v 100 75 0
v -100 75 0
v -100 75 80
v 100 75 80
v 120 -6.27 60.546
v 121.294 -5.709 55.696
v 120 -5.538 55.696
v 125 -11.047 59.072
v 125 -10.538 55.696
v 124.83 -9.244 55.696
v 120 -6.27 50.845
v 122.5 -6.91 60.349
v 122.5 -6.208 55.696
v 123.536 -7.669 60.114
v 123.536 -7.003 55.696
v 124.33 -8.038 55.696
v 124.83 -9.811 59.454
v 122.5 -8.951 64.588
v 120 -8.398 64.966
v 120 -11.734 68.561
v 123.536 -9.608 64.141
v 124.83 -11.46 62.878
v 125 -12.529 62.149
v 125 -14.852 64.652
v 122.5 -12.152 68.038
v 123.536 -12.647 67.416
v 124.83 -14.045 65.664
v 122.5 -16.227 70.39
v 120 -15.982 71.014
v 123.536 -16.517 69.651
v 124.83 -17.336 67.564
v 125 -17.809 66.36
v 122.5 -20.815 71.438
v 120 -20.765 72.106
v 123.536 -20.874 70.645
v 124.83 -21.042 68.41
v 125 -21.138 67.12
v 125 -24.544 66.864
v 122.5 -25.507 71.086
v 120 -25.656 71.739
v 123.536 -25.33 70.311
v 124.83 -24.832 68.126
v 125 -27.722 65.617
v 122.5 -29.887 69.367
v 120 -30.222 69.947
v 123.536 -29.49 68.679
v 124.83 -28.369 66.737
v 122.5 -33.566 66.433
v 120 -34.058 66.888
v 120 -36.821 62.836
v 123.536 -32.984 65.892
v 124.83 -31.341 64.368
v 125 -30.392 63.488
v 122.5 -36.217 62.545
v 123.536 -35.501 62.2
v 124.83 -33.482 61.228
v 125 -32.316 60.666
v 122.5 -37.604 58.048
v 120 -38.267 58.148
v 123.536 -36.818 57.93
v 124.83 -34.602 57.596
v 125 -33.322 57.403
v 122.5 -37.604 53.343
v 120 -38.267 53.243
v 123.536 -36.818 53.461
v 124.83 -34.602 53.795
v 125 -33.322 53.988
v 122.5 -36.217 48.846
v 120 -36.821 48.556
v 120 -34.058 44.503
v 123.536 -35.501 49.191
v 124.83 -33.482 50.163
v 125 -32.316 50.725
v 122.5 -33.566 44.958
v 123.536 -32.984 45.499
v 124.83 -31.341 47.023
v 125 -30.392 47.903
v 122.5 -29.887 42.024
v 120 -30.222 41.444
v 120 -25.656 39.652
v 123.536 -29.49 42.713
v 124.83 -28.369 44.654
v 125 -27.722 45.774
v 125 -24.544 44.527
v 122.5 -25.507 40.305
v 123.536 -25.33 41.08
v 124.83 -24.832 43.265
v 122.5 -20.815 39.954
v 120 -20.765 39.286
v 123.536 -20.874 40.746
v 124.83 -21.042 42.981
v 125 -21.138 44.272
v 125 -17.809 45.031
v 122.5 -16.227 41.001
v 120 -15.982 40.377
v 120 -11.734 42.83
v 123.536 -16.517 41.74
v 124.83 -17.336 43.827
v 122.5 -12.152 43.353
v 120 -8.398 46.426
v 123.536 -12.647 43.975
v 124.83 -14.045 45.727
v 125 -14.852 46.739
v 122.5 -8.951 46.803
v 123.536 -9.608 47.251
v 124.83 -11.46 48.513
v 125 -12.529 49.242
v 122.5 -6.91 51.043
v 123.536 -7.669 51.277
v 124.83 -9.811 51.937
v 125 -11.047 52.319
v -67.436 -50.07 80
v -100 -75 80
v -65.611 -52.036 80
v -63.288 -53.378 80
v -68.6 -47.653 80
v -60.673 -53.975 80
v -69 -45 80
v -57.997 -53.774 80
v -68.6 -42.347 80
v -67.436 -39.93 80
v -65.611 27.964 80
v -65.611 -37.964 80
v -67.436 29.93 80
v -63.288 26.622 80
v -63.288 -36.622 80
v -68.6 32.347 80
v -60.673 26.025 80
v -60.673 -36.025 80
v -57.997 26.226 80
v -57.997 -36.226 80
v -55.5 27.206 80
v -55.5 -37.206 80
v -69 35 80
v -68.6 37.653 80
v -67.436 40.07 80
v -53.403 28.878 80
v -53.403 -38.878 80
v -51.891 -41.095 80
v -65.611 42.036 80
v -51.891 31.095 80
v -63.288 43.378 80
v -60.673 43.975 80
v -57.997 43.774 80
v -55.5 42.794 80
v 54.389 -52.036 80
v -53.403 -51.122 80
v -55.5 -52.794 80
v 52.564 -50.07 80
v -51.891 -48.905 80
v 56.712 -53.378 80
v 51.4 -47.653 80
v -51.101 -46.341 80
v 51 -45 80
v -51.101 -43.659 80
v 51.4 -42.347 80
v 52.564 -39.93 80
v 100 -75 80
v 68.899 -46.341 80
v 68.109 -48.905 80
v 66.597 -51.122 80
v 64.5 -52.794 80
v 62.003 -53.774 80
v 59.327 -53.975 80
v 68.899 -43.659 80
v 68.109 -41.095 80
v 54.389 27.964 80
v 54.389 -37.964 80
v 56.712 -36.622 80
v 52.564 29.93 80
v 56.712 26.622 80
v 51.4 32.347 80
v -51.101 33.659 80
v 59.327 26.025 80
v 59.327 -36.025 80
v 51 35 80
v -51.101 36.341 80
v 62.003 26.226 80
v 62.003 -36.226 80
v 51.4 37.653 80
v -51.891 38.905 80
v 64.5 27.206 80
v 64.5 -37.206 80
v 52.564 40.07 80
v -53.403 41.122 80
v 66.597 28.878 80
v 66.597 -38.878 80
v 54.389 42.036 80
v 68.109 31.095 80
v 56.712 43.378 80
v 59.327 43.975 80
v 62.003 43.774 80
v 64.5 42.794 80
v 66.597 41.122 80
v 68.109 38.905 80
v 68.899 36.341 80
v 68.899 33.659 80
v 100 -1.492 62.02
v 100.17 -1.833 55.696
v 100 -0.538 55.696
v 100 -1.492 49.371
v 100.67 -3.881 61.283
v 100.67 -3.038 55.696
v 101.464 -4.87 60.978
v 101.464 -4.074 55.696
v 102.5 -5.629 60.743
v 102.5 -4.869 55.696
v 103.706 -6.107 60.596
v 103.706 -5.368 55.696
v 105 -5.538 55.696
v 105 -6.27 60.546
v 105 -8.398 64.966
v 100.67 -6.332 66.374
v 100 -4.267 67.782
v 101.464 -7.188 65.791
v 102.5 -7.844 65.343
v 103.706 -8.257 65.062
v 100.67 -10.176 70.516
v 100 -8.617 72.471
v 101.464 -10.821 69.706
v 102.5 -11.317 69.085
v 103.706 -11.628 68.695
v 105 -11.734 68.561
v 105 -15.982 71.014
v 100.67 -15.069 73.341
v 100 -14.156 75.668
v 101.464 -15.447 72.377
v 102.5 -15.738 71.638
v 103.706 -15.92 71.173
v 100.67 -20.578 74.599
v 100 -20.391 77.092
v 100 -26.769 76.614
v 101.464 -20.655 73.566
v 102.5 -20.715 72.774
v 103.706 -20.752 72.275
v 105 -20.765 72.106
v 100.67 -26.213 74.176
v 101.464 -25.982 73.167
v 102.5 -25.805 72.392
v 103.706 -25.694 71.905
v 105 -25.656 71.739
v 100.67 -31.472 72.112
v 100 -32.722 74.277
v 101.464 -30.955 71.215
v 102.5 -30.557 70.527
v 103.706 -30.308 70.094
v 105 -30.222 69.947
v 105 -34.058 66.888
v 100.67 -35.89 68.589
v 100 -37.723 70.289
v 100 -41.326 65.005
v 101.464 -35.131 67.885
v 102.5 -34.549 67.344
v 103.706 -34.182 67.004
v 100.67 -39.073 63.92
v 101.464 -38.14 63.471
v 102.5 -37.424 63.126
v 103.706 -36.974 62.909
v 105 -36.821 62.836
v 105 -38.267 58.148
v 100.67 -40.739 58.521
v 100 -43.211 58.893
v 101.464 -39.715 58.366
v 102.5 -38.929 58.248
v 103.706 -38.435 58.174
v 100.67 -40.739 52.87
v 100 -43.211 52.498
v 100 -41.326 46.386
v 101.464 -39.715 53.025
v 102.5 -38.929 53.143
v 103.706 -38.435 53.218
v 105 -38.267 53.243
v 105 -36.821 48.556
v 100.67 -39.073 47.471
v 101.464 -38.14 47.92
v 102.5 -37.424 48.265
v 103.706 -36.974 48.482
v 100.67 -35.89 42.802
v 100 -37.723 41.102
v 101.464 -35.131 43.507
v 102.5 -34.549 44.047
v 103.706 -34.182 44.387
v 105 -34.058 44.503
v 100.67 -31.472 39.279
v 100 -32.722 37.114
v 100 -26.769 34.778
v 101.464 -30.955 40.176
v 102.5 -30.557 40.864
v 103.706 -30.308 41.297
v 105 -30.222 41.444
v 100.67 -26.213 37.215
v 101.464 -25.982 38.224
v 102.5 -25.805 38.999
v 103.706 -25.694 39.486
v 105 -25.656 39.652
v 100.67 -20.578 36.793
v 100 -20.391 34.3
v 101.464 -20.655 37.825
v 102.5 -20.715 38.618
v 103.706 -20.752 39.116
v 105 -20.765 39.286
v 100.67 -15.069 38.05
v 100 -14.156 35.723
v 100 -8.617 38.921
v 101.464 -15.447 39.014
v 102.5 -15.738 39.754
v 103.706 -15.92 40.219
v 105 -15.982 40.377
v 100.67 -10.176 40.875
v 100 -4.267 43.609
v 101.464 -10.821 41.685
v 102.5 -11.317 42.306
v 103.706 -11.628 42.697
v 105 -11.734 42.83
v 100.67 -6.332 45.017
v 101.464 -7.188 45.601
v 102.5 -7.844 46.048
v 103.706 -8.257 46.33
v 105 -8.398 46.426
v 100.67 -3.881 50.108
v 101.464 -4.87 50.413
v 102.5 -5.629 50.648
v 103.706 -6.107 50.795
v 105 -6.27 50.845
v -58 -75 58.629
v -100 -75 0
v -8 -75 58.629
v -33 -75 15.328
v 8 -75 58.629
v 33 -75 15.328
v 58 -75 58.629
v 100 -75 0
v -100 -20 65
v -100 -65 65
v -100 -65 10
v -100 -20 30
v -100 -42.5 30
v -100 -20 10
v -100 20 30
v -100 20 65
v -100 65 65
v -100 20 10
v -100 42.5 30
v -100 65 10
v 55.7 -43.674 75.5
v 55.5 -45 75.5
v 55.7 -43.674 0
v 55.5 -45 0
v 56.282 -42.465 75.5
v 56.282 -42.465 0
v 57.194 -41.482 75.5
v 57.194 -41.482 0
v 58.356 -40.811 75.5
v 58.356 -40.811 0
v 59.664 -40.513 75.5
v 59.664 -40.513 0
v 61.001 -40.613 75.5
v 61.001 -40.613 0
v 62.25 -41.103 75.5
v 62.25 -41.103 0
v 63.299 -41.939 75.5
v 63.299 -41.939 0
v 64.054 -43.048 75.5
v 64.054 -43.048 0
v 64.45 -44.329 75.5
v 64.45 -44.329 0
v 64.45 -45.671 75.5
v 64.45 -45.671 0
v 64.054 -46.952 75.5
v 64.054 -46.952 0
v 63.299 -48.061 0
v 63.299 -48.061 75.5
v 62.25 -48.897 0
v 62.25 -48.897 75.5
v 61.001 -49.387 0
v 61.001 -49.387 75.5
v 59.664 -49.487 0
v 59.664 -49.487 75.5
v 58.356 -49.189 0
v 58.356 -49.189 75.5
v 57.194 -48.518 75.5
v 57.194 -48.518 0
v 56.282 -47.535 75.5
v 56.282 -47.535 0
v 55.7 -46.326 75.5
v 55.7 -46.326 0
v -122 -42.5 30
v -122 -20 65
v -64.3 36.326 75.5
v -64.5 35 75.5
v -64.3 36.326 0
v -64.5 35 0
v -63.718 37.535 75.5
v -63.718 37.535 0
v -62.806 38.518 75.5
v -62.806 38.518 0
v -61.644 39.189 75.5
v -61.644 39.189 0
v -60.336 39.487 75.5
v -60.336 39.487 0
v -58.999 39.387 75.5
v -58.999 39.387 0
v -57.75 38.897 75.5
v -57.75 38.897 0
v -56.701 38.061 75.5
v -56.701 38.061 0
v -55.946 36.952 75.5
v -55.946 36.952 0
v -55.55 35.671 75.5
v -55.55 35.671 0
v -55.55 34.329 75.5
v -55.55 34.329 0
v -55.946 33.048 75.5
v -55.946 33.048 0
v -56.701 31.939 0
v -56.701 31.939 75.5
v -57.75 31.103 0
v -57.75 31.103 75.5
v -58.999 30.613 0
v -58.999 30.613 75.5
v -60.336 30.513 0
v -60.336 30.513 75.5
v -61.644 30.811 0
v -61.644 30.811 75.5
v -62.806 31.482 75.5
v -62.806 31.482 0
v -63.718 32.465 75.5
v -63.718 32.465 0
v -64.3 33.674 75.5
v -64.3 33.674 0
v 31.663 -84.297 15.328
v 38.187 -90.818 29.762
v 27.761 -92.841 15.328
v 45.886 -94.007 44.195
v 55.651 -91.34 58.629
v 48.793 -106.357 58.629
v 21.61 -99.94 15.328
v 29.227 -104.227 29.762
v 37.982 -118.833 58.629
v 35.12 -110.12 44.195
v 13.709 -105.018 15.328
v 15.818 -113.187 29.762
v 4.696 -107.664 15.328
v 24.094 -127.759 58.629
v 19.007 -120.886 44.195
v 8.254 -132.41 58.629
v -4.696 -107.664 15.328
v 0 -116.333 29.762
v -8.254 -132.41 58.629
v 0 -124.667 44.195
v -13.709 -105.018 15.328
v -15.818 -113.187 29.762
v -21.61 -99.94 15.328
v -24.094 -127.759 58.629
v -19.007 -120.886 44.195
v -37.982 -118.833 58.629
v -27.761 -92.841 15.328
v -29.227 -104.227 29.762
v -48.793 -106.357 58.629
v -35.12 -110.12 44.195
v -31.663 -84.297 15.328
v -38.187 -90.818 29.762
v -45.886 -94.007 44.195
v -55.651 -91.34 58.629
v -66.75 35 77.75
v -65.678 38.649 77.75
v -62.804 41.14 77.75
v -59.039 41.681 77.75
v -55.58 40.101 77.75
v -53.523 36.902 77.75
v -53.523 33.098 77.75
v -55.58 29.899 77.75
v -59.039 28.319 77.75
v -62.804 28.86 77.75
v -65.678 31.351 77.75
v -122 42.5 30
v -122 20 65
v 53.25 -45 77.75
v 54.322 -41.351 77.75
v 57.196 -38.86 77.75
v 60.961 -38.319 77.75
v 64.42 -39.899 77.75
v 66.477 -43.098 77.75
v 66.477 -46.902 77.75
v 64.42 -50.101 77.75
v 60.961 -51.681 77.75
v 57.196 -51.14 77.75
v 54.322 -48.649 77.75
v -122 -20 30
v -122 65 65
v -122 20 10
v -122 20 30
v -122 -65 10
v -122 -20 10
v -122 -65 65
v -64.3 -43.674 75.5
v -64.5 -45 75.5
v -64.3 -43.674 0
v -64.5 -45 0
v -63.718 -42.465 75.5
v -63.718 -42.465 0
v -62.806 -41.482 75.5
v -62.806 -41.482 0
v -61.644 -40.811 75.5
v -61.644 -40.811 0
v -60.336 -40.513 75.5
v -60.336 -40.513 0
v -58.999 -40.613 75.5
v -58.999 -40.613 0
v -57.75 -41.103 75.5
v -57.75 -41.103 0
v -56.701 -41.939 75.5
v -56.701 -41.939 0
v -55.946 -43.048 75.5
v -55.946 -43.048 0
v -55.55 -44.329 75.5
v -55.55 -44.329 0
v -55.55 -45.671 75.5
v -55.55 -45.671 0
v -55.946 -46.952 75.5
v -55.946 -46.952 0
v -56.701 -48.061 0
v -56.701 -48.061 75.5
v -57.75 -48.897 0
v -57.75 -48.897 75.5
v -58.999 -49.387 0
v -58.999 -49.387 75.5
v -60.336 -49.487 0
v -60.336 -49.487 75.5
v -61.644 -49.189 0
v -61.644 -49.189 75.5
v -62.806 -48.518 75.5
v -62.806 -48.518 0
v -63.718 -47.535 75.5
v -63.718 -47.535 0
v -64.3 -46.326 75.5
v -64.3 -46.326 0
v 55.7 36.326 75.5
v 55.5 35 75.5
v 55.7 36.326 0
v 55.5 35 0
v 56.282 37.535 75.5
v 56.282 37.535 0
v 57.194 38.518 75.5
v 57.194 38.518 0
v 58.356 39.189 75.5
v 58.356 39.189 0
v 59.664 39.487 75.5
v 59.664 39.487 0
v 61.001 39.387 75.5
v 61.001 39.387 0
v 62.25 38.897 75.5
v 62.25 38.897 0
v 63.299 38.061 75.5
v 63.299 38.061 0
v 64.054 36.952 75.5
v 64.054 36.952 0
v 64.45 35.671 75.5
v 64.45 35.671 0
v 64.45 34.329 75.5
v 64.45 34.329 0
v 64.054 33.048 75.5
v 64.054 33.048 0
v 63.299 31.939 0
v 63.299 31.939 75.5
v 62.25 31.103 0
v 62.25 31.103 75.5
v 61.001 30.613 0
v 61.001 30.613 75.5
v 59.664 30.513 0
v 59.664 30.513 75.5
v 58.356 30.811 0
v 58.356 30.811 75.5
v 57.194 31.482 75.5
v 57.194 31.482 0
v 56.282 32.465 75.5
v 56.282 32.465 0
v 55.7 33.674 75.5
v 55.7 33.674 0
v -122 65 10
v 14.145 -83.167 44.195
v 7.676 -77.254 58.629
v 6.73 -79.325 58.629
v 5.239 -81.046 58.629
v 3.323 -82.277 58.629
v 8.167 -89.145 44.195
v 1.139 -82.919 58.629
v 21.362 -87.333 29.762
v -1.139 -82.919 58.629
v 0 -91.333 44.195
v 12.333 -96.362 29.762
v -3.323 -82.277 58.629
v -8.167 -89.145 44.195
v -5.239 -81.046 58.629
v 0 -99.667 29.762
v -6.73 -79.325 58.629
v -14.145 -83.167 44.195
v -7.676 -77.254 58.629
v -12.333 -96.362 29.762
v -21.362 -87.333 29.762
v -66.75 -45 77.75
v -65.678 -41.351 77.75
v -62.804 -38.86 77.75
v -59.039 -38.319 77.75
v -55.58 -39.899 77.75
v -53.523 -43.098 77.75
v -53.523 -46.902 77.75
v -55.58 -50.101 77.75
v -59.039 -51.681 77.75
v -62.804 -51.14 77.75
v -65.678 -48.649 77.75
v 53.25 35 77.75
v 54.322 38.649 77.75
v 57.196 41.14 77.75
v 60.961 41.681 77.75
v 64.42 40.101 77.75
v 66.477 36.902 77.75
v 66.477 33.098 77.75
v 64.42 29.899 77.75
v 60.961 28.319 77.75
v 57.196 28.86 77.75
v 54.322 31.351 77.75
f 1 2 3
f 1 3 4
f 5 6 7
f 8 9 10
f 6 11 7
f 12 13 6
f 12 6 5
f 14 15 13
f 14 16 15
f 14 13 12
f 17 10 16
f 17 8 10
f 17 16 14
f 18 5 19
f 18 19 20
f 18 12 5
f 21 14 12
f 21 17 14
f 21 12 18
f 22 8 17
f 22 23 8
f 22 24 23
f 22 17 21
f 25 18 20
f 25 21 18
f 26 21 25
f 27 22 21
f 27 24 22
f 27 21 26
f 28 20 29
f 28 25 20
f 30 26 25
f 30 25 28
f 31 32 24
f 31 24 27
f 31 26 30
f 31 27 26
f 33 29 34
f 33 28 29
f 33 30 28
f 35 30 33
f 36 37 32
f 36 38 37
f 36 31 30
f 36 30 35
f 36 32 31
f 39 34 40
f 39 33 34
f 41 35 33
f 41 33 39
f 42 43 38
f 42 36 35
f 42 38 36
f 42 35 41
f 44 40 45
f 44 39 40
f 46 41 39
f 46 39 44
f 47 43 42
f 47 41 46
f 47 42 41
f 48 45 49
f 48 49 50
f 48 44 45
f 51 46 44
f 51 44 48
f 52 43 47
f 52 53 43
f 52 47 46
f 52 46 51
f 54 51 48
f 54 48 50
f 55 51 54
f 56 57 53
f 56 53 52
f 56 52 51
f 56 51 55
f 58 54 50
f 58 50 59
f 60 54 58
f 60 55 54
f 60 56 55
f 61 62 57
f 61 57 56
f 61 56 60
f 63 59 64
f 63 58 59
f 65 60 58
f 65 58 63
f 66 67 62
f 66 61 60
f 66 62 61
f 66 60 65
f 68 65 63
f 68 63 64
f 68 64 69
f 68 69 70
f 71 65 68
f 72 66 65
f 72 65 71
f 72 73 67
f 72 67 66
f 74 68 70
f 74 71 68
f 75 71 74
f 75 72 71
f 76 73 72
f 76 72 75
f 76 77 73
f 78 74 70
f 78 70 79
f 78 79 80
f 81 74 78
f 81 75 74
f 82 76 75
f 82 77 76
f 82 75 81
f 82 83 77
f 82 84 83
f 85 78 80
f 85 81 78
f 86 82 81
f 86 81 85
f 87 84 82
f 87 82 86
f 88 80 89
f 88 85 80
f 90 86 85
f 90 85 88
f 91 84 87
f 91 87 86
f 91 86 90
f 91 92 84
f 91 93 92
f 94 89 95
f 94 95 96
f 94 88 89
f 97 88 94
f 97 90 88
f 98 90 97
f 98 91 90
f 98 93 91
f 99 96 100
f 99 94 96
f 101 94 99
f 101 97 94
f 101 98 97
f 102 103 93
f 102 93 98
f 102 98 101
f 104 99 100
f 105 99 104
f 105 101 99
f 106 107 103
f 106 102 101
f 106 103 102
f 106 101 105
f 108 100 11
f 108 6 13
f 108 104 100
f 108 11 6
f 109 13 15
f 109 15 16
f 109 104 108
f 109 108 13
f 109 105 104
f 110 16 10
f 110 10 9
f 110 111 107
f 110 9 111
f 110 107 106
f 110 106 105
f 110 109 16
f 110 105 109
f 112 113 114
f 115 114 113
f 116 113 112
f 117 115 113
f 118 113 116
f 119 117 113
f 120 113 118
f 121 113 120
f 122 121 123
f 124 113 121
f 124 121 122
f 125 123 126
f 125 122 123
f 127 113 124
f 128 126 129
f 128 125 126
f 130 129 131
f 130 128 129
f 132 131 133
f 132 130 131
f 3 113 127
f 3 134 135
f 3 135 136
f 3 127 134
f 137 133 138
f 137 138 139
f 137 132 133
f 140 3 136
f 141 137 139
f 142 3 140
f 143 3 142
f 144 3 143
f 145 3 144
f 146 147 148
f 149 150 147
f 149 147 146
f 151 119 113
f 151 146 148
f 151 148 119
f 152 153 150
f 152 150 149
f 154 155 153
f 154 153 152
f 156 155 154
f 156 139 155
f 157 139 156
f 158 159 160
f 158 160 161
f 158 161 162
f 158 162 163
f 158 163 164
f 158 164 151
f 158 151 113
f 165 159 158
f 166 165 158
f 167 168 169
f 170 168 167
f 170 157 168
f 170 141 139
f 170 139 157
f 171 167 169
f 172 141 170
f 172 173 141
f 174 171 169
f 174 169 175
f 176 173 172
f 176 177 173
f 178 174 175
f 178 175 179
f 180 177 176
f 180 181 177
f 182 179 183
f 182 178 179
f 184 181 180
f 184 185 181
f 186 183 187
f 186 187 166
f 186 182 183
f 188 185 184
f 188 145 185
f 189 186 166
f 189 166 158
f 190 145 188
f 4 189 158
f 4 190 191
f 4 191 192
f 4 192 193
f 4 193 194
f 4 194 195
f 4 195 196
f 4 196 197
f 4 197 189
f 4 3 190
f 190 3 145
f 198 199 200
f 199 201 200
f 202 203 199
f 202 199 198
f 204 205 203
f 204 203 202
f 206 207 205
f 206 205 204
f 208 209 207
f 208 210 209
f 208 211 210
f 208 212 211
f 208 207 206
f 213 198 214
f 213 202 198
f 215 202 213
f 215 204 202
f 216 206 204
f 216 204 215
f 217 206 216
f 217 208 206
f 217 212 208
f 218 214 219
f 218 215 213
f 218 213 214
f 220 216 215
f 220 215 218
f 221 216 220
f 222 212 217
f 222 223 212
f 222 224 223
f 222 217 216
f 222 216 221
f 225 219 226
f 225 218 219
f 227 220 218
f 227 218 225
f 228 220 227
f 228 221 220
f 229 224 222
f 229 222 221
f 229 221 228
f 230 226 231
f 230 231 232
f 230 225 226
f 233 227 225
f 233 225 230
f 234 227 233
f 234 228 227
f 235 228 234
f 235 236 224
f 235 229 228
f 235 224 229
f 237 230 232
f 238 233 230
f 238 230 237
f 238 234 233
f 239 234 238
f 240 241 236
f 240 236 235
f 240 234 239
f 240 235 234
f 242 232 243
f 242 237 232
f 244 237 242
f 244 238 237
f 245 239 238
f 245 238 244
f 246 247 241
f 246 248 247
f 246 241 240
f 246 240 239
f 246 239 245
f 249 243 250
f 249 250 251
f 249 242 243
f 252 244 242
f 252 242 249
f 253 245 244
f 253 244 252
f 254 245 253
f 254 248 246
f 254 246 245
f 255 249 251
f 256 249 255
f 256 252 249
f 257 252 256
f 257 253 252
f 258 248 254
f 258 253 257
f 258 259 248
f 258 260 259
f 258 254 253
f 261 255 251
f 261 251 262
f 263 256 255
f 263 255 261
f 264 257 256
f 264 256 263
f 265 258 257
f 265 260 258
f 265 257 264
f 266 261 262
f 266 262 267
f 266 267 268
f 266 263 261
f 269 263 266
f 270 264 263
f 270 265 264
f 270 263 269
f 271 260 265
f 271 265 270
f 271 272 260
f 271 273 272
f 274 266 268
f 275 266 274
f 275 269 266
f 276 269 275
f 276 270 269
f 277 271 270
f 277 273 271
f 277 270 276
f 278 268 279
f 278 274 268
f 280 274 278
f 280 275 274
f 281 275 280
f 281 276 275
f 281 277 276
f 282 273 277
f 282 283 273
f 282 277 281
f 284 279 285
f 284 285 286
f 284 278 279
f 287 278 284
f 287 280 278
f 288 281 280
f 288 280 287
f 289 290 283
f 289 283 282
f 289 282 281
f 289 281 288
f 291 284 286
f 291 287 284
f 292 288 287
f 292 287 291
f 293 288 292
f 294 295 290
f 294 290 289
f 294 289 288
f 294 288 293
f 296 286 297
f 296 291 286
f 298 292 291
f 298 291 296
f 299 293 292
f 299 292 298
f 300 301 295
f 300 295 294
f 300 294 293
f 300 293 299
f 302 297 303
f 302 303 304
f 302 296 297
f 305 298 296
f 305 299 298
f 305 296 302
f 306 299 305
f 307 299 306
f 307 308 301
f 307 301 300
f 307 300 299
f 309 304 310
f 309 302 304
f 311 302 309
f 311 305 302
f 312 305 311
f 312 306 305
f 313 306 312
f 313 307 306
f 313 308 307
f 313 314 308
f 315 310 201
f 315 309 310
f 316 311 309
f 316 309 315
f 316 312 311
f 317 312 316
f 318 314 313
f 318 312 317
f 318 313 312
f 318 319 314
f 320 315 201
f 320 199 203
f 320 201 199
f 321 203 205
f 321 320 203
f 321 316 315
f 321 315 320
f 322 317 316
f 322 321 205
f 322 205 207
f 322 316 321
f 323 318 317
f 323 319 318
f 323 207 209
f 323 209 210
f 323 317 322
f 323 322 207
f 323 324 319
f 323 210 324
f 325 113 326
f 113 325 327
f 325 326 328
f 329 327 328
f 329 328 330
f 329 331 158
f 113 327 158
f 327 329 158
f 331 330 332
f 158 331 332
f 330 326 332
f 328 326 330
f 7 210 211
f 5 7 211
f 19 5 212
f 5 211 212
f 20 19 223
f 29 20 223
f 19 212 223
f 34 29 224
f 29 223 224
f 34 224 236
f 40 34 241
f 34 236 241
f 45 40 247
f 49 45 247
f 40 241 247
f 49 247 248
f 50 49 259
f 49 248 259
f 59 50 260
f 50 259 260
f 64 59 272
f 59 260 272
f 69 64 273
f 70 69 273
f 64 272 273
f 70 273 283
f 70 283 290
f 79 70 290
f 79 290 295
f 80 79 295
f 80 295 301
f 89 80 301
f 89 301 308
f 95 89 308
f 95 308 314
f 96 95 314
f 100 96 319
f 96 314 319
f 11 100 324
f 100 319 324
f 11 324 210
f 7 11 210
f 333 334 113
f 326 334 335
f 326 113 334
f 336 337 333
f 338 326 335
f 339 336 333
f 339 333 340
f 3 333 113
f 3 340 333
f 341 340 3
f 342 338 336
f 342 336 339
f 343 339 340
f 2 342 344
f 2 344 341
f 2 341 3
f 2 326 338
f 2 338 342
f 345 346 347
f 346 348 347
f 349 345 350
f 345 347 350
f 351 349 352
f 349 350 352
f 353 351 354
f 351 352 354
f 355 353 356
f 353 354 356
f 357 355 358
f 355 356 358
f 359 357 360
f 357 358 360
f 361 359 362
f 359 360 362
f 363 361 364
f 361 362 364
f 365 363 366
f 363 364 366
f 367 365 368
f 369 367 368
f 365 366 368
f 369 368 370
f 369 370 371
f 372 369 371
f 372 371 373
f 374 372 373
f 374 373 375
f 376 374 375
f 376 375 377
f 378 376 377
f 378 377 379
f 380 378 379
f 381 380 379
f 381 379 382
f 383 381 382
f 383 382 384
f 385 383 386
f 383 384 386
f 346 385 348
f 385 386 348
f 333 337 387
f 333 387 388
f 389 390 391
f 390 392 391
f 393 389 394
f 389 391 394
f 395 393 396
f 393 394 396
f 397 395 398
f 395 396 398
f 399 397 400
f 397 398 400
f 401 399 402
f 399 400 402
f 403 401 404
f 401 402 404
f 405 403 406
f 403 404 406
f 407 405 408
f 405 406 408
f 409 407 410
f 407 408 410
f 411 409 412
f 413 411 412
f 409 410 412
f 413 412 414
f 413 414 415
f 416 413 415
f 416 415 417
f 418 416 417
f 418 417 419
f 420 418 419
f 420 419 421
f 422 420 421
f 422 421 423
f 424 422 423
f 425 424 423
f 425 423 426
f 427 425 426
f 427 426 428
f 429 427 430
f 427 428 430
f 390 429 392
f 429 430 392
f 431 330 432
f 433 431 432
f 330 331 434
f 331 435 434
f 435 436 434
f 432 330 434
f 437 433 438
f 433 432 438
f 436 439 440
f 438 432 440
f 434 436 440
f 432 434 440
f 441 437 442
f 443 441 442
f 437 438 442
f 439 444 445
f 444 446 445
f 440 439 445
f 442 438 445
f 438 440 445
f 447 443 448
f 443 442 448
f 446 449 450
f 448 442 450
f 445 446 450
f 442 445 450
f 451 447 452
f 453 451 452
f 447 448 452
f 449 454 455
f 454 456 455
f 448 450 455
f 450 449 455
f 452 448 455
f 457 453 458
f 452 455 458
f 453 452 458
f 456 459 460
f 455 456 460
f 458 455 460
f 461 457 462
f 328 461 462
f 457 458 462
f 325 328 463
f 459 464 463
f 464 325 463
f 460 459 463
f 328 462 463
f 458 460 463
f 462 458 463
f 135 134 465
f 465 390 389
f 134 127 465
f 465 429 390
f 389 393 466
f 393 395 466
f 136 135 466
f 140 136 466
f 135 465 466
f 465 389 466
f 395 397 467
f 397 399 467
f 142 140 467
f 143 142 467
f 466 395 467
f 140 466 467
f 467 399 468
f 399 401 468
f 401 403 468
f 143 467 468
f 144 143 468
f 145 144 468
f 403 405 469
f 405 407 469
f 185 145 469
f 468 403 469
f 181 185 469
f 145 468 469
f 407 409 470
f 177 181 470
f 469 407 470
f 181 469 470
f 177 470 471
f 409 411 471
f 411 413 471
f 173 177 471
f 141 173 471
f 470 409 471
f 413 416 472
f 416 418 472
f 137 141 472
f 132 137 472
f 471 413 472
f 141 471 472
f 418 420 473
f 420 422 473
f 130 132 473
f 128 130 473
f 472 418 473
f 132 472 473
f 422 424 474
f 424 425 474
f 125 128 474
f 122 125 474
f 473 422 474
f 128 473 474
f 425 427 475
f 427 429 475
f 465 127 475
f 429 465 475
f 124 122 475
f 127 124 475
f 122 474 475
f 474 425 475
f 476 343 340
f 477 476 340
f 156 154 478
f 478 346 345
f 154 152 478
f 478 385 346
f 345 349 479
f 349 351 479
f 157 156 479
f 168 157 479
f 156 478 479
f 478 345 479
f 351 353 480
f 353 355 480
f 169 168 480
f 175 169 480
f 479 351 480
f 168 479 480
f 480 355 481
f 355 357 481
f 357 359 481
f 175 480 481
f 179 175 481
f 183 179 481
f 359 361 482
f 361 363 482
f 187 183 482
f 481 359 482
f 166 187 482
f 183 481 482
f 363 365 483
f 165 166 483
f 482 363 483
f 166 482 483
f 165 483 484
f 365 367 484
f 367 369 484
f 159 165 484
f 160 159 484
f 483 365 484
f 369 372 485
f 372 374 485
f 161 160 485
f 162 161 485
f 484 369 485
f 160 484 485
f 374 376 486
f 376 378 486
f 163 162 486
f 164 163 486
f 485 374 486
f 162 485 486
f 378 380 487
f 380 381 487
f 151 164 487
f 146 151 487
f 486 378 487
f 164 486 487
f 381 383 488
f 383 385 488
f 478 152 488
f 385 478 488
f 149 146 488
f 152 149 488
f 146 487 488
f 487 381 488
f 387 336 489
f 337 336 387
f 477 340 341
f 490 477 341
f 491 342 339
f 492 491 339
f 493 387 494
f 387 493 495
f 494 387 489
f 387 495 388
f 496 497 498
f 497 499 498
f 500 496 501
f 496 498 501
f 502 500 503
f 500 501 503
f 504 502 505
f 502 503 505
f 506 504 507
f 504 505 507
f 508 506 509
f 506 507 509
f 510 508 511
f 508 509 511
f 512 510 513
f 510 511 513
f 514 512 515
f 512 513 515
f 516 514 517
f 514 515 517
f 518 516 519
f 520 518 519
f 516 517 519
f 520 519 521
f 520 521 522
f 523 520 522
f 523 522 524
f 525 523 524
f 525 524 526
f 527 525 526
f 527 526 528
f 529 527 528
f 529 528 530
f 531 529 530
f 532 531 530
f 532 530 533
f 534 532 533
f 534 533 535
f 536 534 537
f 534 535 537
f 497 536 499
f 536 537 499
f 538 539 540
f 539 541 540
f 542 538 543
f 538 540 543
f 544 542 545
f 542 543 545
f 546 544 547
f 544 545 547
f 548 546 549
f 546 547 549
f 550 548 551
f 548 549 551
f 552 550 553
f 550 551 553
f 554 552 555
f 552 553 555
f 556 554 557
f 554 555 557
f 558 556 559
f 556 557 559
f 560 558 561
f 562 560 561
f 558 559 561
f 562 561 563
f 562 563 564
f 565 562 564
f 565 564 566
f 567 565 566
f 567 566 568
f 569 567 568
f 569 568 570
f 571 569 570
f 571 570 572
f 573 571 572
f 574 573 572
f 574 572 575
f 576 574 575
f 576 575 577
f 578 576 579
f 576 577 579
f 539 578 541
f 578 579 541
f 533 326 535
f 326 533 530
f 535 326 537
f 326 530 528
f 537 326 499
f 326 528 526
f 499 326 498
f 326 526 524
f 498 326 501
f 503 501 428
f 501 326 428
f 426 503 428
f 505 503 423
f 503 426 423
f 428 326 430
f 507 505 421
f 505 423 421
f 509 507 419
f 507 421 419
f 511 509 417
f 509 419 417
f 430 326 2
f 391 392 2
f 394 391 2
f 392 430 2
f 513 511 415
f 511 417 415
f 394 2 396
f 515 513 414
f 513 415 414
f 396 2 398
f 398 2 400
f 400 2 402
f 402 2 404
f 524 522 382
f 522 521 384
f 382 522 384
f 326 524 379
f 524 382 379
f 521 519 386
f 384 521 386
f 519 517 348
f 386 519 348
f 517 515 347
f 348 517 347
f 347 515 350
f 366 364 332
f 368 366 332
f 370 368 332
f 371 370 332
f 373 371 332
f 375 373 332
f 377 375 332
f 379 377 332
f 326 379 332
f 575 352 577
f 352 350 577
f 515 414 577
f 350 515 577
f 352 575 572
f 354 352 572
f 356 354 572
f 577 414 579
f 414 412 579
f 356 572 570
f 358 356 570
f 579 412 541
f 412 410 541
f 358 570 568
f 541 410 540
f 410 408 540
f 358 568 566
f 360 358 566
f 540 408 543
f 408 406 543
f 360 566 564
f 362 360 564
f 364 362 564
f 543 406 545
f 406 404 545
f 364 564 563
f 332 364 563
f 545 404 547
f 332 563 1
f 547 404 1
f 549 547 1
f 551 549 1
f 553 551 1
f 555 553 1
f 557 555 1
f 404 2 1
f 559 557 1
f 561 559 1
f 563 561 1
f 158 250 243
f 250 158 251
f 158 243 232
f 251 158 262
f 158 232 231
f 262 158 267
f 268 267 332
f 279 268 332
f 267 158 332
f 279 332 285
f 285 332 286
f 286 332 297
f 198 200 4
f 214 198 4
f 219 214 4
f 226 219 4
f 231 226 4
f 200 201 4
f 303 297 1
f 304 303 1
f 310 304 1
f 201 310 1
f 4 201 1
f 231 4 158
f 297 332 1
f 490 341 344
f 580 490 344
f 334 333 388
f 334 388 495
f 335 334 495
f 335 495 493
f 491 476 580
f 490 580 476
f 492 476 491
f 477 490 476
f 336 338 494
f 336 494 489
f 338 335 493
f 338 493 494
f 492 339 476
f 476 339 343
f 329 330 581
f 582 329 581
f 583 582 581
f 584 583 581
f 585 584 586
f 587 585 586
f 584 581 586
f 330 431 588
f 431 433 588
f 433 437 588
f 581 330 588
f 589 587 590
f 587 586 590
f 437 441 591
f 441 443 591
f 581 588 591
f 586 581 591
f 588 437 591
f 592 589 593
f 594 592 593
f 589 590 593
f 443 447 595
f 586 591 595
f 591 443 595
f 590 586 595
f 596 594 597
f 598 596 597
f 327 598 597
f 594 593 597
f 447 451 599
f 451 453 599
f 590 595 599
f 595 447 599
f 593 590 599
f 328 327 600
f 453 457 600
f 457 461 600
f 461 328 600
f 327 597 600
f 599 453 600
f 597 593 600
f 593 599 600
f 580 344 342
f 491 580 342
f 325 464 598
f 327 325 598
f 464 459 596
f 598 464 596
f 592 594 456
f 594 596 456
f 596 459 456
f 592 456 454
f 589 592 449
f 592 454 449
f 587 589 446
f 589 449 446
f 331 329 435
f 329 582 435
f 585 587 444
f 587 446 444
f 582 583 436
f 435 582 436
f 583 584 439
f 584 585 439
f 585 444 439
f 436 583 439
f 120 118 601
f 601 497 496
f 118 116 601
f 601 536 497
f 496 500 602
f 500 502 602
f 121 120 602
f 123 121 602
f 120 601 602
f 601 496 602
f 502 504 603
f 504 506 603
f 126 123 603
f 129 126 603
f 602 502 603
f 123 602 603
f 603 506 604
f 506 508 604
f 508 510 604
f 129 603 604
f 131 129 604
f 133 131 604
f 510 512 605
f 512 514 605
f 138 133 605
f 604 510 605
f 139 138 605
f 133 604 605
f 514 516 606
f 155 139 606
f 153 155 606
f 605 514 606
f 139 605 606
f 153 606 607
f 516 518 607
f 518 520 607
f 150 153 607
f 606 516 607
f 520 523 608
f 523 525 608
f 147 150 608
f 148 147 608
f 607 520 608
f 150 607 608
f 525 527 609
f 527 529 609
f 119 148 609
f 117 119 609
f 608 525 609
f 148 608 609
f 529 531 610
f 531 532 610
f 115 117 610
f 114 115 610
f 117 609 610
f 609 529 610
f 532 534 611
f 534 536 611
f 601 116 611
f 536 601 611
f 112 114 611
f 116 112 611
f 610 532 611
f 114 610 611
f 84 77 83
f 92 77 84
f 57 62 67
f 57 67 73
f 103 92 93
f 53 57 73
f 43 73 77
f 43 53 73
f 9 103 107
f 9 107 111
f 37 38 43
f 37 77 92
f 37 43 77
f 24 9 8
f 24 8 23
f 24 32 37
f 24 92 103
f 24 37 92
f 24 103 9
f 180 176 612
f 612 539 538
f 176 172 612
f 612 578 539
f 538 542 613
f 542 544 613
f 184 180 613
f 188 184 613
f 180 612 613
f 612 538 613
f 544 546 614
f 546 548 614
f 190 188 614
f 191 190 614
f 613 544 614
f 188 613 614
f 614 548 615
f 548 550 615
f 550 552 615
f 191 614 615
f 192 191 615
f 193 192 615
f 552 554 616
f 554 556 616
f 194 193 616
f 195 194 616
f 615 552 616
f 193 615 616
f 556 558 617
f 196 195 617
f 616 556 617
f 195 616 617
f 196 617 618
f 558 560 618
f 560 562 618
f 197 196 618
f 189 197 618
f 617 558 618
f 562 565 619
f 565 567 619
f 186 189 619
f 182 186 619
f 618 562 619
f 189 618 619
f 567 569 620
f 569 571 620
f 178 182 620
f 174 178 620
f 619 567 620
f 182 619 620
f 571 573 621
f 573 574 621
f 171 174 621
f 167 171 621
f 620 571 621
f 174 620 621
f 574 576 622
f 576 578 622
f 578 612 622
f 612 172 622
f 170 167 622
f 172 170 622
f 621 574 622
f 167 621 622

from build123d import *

# Parameters (mm, degrees)
F0_W            = 200
F0_H            = 150
F1_DEPTH        = 80
F13_D           = 9
F13_CSINK_D     = 18
F13_CSINK_ANGLE = 90
F2_R            = 16.4559911856
F3_DEPTH        = 60
F4_DEPTH        = 25
F14_R           = 5
F5_R            = 5
F11_DEPTH       = 22


# Not quite as in the source:
# - a pattern or mirror of a feature is missing from the dataset's text; its kind, count and spacing are read off the source's solid


with BuildPart() as f1:
    # F0 (on Top) → F1 (new body)
    with BuildSketch(Plane.XY):
        Rectangle(F0_W, F0_H)
    extrude(amount=F1_DEPTH)

    # F13 (through all)
    with Locations(Plane.XY.offset(80)):
        with Locations((-60, 35), (-60, -45), (60, 35), (60, -45)):
            CounterSinkHole(F13_D / 2, F13_CSINK_D / 2, counter_sink_angle=F13_CSINK_ANGLE)

    # F2 (on face) → F4 (join)
    with BuildSketch(Plane.YZ.offset(100)):
        with Locations((-21.9944119453, 55.6955486536)):
            Circle(F2_R)
    extrude(amount=F4_DEPTH)

    # F14
    f14_edges = [f1.edges().sort_by_distance(p)[0] for p in [
        (100, -38.450403, 55.695549),
        (125, -38.450403, 55.695549),
    ]]
    fillet(f14_edges, radius=F14_R)

    # F7 (on face) → F15 (revolve)
    with BuildSketch(Plane.XZ.offset(75)):
        Polygon((8, 58.6291704433), (33, 15.327900254), (58, 58.6291704433), align=None)
    revolve(axis=Axis((0, -75, 40), (0, 0, -1)))

    # F10 (on face) → F11 (join)
    with BuildSketch(Plane(origin=(-100, 0, 0), x_dir=(0, -1, 0), z_dir=(-1, 0, 0))):
        Polygon((-20, 65), (-65, 65), (-65, 10), (-20, 10), (-20, 30), (-42.5, 30), align=None)
    f11 = extrude(amount=F11_DEPTH)

    # F11_copies: F11 across plane
    add(f11.mirror(Plane(origin=(0, 0, 0), x_dir=(0, 0, -1), z_dir=(0, -1, 0))))


with BuildPart() as f3:
    # F2 (on face) → F3 (new body)
    with BuildSketch(Plane.YZ.offset(100)):
        with Locations((78.0055880547, 135.6955486536)):
            Circle(F2_R)
    extrude(amount=F3_DEPTH)

    # F5
    f5_edges = [f3.edges().sort_by_distance(p)[0] for p in [
        (160, 61.549597, 135.695549),
        (100, 61.549597, 135.695549),
    ]]
    fillet(f5_edges, radius=F5_R)


with BuildPart() as f6_1:
    # F6: instance of F3
    add(f3.part.mirror(Plane.YZ))


solid = f1.part
